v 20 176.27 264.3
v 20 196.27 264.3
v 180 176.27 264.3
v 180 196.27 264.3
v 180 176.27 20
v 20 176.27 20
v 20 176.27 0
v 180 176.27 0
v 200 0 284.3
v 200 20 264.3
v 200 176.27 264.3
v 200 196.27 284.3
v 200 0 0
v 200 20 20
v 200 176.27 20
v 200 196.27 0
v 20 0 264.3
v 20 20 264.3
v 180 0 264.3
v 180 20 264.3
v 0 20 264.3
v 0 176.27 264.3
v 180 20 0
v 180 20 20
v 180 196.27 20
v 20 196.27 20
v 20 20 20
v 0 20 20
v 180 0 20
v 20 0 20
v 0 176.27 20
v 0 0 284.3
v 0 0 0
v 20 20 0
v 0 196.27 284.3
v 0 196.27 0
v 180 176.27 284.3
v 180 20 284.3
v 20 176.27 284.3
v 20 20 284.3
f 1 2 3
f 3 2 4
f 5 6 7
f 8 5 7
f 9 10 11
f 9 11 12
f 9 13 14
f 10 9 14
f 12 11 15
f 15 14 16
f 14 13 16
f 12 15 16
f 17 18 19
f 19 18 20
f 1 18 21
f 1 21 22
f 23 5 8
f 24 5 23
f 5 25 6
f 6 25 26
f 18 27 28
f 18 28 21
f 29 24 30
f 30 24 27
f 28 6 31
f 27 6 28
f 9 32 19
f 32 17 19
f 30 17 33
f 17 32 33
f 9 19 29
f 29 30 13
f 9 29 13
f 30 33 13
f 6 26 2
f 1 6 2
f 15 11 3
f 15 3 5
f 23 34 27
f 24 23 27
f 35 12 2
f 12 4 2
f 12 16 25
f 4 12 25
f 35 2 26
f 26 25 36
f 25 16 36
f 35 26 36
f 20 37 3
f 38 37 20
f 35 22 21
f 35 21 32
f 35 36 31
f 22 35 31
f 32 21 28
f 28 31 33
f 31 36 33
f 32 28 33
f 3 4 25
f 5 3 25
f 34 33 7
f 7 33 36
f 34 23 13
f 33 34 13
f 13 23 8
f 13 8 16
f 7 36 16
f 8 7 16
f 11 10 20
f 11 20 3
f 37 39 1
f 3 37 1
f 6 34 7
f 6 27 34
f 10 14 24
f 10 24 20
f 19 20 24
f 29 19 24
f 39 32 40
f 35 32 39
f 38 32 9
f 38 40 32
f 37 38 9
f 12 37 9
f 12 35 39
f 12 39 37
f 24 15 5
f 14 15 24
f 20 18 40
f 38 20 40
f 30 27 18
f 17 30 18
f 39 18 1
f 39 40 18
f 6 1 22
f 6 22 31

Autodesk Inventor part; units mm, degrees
ref_plane "YZ Plane" through (0, 0, 0) normal (1, 0, 0) x (0, 1, 0)
ref_plane "XZ Plane" through (0, 0, 0) normal (0, 1, 0) x (-1, 0, 0)
ref_plane "XY Plane" through (0, 0, 0) normal (0, 0, 1) x (1, 0, 0)
sketch "Sketch1" plane through (0, 0, 0) normal (0, 0, 1) x (1, 0, 0)
  line L0 (0, 0) -> (200, 0)
  line L1 (200, 0) -> (200, 196.27)
  line L2 (200, 196.27) -> (0, 196.27)
  line L3 (0, 196.27) -> (0, 0)
  dimension "d0" = 200
  dimension "d1" = 196.27
extrude "Extrusion1" add sketch "Sketch1" along normal blind 284.3
sketch "Sketch2" plane through (0, 0, 284.3) normal (0, 0, 1) x (1, 0, 0)
  line L0 (20, 176.27) -> (180, 176.27)
  line L1 (180, 176.27) -> (180, 20)
  line L2 (180, 20) -> (20, 20)
  line L3 (20, 20) -> (20, 176.27)
  line L4 (200, 196.27) -> (0, 196.27) projected
  line L5 (0, 196.27) -> (0, 0) projected
  line L6 (200, 0) -> (200, 196.27) projected
  line L7 (0, 0) -> (200, 0) projected
  dimension "d4" = 20
  dimension "d5" = 20
  dimension "d6" = 20
  dimension "d7" = 20
extrude "Extrusion2" cut sketch "Sketch2" against normal blind 900 contours L0 L1 L2 L3
sketch "Sketch3" plane through (200, 0, 0) normal (1, 0, 0) x (0, 0, -1)
  line L0 (-264.3, 176.27) -> (-20, 176.27)
  line L1 (-20, 176.27) -> (-20, 20)
  line L2 (-20, 20) -> (-264.3, 20)
  line L3 (-264.3, 20) -> (-264.3, 176.27)
  line L4 (0, 196.27) -> (-284.3, 196.27) projected
  line L5 (-284.3, 0) -> (-284.3, 196.27) projected
  line L6 (0, 0) -> (-284.3, 0) projected
  line L7 (0, 0) -> (0, 196.27) projected
  dimension "d10" = 20
  dimension "d11" = 20
  dimension "d12" = 20
  dimension "d13" = 20
extrude "Extrusion3" cut sketch "Sketch3" against normal blind 900 contours L0 L1 L2 L3
sketch "Sketch4" plane through (0, 196.27, 0) normal (0, 1, 0) x (1, 0, 0)
  line L0 (20, -264.3) -> (0, -264.3) projected
  line L1 (180, -20) -> (180, 0) projected
  line L2 (20, -264.3) -> (180, -264.3)
  line L3 (180, -264.3) -> (180, -20)
  line L4 (180, -20) -> (20, -20)
  line L5 (20, -20) -> (20, -264.3)
  point P0 (0, 0)
extrude "Extrusion4" cut sketch "Sketch4" against normal blind 900
properties part number "Motor Pump Housing"
